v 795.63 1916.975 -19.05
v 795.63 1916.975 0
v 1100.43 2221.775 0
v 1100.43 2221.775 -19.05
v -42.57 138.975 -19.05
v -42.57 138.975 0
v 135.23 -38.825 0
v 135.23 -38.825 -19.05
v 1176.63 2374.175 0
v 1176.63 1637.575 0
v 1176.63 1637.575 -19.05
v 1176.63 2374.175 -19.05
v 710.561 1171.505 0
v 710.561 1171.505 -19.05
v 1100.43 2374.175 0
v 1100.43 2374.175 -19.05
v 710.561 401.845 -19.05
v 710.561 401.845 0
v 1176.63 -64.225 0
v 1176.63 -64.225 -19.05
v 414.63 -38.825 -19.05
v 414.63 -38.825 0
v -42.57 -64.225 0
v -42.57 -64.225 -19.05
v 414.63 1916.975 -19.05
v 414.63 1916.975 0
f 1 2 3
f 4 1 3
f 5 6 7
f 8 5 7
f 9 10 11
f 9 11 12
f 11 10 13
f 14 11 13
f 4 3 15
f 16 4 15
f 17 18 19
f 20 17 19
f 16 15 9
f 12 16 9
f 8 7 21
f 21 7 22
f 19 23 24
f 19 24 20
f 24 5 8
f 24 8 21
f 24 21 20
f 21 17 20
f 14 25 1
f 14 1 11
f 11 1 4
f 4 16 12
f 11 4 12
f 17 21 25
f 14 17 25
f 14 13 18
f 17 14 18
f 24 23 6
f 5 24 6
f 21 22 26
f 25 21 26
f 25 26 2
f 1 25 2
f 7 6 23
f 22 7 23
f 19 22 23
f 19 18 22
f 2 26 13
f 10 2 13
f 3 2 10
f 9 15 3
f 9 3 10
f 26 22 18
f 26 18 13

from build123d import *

# Parameters (mm, degrees)
F0_W     = 1219.2
F0_H     = 2438.4
F1_DEPTH = 19.05
F3_DEPTH = 25.4
F5_DEPTH = 25.4
F7_DEPTH = 25.4
F9_DEPTH = 25.4


with BuildPart() as f1:
    # F0 (on Top) → F1 (new body)
    with BuildSketch(Plane.XY):
        with Locations((567.030359, 1154.974982)):
            Rectangle(F0_W, F0_H)
    extrude(amount=-F1_DEPTH)

    # F2 (on face) → F3 (cut)
    with BuildSketch(Plane.XY):
        Polygon((414.630359, 1916.974982), (-42.569641, 2374.174982), (-42.569641, 672.374982), (414.630359, 1129.574982), align=None)
    extrude(amount=-F3_DEPTH, mode=Mode.SUBTRACT)

    # F4 (on face) → F5 (cut)
    with BuildSketch(Plane.XY):
        Polygon((414.630359, 1129.574982), (-42.569641, 672.374982), (-42.569641, 138.974982), (135.230359, -38.825018), (414.630359, -38.825018), align=None)
    extrude(amount=-F5_DEPTH, mode=Mode.SUBTRACT)

    # F6 (on face) → F7 (cut)
    with BuildSketch(Plane.XY):
        Polygon((-42.569641, 2374.174982), (414.630359, 1916.974982), (795.630359, 1916.974982), (1100.430359, 2221.774982), (1100.430359, 2374.174982), align=None)
    extrude(amount=-F7_DEPTH, mode=Mode.SUBTRACT)

    # F8 (on face) → F9 (cut)
    with BuildSketch(Plane.XY):
        Polygon((710.56071, 401.844631), (1176.630359, -64.225018), (1176.630359, 1637.574982), (710.56071, 1171.505333), align=None)
    extrude(amount=-F9_DEPTH, mode=Mode.SUBTRACT)


solid = f1.part
